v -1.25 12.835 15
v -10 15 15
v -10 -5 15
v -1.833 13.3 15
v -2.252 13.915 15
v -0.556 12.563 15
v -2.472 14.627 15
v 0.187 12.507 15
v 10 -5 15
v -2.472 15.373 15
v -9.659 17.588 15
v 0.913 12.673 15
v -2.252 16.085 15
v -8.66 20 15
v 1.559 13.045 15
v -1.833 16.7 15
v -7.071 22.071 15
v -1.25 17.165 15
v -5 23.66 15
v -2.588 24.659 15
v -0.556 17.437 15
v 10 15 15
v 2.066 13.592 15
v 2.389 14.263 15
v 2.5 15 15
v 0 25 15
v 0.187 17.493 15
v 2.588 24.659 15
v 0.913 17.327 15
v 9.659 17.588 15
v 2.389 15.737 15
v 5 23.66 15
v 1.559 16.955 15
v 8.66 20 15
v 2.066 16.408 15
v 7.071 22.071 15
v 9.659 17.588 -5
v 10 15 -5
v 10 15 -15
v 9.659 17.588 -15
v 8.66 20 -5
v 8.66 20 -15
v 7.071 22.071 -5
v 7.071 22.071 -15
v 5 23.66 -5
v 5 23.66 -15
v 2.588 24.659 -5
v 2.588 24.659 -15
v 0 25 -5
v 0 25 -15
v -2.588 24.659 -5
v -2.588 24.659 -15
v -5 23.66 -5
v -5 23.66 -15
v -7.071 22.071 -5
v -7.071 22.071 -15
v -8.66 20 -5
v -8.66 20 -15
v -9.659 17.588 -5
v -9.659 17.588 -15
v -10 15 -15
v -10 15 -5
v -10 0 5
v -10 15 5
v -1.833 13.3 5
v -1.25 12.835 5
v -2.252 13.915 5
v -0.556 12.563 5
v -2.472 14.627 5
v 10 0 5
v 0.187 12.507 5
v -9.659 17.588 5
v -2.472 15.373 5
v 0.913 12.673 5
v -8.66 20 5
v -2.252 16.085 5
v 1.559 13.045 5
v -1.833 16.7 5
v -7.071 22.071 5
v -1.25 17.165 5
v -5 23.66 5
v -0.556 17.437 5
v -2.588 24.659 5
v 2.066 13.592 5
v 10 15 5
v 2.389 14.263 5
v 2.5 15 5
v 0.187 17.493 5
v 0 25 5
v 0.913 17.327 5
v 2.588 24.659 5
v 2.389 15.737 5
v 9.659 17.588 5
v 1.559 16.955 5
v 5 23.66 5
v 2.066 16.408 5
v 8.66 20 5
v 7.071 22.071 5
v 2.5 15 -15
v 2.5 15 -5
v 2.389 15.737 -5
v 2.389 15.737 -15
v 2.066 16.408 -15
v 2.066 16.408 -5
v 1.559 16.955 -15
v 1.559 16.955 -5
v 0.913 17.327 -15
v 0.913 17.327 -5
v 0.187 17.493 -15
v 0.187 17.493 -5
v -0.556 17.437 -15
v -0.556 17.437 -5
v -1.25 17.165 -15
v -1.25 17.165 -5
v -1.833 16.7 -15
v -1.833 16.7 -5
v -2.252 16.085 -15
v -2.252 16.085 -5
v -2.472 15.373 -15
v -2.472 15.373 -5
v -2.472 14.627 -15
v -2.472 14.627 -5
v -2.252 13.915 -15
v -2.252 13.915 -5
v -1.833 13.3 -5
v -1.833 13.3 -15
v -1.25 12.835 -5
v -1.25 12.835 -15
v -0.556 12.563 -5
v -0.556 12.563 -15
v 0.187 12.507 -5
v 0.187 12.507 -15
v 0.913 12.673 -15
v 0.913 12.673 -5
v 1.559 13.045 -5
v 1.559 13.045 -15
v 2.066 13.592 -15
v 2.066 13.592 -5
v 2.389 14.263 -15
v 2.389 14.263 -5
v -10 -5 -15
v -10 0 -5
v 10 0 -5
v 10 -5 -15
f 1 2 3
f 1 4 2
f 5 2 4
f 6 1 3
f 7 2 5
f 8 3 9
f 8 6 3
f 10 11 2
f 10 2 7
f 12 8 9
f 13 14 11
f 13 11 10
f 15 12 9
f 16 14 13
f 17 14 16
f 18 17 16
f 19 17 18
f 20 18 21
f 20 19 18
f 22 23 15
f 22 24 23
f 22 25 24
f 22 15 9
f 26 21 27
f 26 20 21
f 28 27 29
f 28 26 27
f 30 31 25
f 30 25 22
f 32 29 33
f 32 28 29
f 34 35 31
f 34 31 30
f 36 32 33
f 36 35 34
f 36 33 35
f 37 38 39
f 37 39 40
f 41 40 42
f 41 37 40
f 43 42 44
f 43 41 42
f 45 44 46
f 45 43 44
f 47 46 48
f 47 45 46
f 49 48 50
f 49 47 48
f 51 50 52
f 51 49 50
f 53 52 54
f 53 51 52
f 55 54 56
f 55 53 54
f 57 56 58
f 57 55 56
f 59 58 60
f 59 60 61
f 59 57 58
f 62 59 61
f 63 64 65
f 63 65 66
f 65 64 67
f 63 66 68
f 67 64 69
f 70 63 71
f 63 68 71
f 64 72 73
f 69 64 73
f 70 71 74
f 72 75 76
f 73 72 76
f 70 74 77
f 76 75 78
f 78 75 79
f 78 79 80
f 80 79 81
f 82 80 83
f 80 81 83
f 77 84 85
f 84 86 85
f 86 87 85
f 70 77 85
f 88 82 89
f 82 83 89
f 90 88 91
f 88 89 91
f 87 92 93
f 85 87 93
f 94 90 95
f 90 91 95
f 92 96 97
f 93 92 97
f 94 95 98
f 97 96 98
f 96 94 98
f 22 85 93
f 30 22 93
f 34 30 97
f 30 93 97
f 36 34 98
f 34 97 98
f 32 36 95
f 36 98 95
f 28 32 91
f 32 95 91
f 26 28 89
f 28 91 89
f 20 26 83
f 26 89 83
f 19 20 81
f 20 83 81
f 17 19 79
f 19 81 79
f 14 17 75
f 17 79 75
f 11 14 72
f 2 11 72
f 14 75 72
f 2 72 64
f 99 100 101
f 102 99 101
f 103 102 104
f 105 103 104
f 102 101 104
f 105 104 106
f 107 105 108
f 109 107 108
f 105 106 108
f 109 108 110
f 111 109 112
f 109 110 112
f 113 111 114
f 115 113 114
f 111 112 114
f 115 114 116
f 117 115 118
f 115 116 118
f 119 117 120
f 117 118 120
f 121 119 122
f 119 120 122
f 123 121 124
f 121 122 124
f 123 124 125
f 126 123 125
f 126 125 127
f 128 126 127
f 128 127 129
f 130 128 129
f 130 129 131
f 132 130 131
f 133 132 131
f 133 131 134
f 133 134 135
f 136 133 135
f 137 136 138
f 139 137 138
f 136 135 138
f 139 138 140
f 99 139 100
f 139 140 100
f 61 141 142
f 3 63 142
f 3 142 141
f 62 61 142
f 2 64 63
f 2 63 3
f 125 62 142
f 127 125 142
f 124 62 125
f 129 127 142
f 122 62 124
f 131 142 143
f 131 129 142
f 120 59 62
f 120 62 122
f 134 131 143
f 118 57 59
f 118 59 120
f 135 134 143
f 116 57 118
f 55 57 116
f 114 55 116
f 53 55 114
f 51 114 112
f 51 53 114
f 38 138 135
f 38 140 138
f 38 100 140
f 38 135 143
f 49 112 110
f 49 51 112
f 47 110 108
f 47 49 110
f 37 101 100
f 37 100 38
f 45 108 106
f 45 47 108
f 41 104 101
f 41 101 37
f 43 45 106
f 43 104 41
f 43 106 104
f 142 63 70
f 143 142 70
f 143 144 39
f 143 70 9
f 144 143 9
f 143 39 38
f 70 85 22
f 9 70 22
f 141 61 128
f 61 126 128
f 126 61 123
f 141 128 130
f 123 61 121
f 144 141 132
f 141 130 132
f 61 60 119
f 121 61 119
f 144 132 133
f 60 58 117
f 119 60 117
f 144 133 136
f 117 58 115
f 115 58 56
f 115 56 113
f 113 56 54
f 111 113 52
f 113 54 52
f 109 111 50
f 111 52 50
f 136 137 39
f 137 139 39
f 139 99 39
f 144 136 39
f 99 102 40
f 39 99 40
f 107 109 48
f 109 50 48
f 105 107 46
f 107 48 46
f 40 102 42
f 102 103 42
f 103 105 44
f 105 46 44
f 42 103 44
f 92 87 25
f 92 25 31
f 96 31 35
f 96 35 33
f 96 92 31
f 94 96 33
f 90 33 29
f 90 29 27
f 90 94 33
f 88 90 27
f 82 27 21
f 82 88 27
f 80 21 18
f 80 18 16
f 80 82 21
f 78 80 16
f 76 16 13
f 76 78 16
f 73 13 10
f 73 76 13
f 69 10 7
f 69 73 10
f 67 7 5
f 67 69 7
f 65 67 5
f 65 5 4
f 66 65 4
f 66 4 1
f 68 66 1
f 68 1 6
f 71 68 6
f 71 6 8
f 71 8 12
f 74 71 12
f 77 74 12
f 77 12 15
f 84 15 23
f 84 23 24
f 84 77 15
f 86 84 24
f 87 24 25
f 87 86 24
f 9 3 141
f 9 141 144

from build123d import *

# Parameters (mm, degrees)
BOSS_EXTRUDE1_START = 5
SKETCH1_R           = 2.5
BOSS_EXTRUDE1_DEPTH = 10
BOSS_EXTRUDE2_START = -5
SKETCH1_2_R         = 2.5
BOSS_EXTRUDE2_DEPTH = 10
SKETCH2_W           = 20
SKETCH2_H           = 30
BOSS_EXTRUDE3_DEPTH = 5


with BuildPart() as part:
    # Sketch1 → Boss-Extrude1 (new body)
    with BuildSketch(Plane.XY.offset(BOSS_EXTRUDE1_START)):
        with BuildLine():
            Line((-10, 15), (-10, 0))
            Line((-10, 0), (10, 0))
            Line((10, 0), (10, 15))
            ThreePointArc((10, 15), (0, 25), (-10, 15))
        make_face()
        with Locations((0, 15)):
            Circle(SKETCH1_R, mode=Mode.SUBTRACT)
    extrude(amount=BOSS_EXTRUDE1_DEPTH)



with BuildPart() as body_2:
    # Sketch1<2> → Boss-Extrude2 (new body)
    with BuildSketch(Plane.XY.offset(BOSS_EXTRUDE2_START)):
        with BuildLine():
            Line((-10, 15), (-10, 0))
            Line((-10, 0), (10, 0))
            Line((10, 0), (10, 15))
            ThreePointArc((10, 15), (0, 25), (-10, 15))
        make_face()
        with Locations((0, 15)):
            Circle(SKETCH1_2_R, mode=Mode.SUBTRACT)
    extrude(amount=-BOSS_EXTRUDE2_DEPTH)


with BuildPart() as part_1:
    add(part.part)

    add(body_2.part)  # Boss-Extrude3 merges body 2
    # Sketch2 → Boss-Extrude3 (add)
    with BuildSketch(Plane.XZ):
        Rectangle(SKETCH2_W, SKETCH2_H)
    extrude(amount=BOSS_EXTRUDE3_DEPTH)


solid = part_1.part
